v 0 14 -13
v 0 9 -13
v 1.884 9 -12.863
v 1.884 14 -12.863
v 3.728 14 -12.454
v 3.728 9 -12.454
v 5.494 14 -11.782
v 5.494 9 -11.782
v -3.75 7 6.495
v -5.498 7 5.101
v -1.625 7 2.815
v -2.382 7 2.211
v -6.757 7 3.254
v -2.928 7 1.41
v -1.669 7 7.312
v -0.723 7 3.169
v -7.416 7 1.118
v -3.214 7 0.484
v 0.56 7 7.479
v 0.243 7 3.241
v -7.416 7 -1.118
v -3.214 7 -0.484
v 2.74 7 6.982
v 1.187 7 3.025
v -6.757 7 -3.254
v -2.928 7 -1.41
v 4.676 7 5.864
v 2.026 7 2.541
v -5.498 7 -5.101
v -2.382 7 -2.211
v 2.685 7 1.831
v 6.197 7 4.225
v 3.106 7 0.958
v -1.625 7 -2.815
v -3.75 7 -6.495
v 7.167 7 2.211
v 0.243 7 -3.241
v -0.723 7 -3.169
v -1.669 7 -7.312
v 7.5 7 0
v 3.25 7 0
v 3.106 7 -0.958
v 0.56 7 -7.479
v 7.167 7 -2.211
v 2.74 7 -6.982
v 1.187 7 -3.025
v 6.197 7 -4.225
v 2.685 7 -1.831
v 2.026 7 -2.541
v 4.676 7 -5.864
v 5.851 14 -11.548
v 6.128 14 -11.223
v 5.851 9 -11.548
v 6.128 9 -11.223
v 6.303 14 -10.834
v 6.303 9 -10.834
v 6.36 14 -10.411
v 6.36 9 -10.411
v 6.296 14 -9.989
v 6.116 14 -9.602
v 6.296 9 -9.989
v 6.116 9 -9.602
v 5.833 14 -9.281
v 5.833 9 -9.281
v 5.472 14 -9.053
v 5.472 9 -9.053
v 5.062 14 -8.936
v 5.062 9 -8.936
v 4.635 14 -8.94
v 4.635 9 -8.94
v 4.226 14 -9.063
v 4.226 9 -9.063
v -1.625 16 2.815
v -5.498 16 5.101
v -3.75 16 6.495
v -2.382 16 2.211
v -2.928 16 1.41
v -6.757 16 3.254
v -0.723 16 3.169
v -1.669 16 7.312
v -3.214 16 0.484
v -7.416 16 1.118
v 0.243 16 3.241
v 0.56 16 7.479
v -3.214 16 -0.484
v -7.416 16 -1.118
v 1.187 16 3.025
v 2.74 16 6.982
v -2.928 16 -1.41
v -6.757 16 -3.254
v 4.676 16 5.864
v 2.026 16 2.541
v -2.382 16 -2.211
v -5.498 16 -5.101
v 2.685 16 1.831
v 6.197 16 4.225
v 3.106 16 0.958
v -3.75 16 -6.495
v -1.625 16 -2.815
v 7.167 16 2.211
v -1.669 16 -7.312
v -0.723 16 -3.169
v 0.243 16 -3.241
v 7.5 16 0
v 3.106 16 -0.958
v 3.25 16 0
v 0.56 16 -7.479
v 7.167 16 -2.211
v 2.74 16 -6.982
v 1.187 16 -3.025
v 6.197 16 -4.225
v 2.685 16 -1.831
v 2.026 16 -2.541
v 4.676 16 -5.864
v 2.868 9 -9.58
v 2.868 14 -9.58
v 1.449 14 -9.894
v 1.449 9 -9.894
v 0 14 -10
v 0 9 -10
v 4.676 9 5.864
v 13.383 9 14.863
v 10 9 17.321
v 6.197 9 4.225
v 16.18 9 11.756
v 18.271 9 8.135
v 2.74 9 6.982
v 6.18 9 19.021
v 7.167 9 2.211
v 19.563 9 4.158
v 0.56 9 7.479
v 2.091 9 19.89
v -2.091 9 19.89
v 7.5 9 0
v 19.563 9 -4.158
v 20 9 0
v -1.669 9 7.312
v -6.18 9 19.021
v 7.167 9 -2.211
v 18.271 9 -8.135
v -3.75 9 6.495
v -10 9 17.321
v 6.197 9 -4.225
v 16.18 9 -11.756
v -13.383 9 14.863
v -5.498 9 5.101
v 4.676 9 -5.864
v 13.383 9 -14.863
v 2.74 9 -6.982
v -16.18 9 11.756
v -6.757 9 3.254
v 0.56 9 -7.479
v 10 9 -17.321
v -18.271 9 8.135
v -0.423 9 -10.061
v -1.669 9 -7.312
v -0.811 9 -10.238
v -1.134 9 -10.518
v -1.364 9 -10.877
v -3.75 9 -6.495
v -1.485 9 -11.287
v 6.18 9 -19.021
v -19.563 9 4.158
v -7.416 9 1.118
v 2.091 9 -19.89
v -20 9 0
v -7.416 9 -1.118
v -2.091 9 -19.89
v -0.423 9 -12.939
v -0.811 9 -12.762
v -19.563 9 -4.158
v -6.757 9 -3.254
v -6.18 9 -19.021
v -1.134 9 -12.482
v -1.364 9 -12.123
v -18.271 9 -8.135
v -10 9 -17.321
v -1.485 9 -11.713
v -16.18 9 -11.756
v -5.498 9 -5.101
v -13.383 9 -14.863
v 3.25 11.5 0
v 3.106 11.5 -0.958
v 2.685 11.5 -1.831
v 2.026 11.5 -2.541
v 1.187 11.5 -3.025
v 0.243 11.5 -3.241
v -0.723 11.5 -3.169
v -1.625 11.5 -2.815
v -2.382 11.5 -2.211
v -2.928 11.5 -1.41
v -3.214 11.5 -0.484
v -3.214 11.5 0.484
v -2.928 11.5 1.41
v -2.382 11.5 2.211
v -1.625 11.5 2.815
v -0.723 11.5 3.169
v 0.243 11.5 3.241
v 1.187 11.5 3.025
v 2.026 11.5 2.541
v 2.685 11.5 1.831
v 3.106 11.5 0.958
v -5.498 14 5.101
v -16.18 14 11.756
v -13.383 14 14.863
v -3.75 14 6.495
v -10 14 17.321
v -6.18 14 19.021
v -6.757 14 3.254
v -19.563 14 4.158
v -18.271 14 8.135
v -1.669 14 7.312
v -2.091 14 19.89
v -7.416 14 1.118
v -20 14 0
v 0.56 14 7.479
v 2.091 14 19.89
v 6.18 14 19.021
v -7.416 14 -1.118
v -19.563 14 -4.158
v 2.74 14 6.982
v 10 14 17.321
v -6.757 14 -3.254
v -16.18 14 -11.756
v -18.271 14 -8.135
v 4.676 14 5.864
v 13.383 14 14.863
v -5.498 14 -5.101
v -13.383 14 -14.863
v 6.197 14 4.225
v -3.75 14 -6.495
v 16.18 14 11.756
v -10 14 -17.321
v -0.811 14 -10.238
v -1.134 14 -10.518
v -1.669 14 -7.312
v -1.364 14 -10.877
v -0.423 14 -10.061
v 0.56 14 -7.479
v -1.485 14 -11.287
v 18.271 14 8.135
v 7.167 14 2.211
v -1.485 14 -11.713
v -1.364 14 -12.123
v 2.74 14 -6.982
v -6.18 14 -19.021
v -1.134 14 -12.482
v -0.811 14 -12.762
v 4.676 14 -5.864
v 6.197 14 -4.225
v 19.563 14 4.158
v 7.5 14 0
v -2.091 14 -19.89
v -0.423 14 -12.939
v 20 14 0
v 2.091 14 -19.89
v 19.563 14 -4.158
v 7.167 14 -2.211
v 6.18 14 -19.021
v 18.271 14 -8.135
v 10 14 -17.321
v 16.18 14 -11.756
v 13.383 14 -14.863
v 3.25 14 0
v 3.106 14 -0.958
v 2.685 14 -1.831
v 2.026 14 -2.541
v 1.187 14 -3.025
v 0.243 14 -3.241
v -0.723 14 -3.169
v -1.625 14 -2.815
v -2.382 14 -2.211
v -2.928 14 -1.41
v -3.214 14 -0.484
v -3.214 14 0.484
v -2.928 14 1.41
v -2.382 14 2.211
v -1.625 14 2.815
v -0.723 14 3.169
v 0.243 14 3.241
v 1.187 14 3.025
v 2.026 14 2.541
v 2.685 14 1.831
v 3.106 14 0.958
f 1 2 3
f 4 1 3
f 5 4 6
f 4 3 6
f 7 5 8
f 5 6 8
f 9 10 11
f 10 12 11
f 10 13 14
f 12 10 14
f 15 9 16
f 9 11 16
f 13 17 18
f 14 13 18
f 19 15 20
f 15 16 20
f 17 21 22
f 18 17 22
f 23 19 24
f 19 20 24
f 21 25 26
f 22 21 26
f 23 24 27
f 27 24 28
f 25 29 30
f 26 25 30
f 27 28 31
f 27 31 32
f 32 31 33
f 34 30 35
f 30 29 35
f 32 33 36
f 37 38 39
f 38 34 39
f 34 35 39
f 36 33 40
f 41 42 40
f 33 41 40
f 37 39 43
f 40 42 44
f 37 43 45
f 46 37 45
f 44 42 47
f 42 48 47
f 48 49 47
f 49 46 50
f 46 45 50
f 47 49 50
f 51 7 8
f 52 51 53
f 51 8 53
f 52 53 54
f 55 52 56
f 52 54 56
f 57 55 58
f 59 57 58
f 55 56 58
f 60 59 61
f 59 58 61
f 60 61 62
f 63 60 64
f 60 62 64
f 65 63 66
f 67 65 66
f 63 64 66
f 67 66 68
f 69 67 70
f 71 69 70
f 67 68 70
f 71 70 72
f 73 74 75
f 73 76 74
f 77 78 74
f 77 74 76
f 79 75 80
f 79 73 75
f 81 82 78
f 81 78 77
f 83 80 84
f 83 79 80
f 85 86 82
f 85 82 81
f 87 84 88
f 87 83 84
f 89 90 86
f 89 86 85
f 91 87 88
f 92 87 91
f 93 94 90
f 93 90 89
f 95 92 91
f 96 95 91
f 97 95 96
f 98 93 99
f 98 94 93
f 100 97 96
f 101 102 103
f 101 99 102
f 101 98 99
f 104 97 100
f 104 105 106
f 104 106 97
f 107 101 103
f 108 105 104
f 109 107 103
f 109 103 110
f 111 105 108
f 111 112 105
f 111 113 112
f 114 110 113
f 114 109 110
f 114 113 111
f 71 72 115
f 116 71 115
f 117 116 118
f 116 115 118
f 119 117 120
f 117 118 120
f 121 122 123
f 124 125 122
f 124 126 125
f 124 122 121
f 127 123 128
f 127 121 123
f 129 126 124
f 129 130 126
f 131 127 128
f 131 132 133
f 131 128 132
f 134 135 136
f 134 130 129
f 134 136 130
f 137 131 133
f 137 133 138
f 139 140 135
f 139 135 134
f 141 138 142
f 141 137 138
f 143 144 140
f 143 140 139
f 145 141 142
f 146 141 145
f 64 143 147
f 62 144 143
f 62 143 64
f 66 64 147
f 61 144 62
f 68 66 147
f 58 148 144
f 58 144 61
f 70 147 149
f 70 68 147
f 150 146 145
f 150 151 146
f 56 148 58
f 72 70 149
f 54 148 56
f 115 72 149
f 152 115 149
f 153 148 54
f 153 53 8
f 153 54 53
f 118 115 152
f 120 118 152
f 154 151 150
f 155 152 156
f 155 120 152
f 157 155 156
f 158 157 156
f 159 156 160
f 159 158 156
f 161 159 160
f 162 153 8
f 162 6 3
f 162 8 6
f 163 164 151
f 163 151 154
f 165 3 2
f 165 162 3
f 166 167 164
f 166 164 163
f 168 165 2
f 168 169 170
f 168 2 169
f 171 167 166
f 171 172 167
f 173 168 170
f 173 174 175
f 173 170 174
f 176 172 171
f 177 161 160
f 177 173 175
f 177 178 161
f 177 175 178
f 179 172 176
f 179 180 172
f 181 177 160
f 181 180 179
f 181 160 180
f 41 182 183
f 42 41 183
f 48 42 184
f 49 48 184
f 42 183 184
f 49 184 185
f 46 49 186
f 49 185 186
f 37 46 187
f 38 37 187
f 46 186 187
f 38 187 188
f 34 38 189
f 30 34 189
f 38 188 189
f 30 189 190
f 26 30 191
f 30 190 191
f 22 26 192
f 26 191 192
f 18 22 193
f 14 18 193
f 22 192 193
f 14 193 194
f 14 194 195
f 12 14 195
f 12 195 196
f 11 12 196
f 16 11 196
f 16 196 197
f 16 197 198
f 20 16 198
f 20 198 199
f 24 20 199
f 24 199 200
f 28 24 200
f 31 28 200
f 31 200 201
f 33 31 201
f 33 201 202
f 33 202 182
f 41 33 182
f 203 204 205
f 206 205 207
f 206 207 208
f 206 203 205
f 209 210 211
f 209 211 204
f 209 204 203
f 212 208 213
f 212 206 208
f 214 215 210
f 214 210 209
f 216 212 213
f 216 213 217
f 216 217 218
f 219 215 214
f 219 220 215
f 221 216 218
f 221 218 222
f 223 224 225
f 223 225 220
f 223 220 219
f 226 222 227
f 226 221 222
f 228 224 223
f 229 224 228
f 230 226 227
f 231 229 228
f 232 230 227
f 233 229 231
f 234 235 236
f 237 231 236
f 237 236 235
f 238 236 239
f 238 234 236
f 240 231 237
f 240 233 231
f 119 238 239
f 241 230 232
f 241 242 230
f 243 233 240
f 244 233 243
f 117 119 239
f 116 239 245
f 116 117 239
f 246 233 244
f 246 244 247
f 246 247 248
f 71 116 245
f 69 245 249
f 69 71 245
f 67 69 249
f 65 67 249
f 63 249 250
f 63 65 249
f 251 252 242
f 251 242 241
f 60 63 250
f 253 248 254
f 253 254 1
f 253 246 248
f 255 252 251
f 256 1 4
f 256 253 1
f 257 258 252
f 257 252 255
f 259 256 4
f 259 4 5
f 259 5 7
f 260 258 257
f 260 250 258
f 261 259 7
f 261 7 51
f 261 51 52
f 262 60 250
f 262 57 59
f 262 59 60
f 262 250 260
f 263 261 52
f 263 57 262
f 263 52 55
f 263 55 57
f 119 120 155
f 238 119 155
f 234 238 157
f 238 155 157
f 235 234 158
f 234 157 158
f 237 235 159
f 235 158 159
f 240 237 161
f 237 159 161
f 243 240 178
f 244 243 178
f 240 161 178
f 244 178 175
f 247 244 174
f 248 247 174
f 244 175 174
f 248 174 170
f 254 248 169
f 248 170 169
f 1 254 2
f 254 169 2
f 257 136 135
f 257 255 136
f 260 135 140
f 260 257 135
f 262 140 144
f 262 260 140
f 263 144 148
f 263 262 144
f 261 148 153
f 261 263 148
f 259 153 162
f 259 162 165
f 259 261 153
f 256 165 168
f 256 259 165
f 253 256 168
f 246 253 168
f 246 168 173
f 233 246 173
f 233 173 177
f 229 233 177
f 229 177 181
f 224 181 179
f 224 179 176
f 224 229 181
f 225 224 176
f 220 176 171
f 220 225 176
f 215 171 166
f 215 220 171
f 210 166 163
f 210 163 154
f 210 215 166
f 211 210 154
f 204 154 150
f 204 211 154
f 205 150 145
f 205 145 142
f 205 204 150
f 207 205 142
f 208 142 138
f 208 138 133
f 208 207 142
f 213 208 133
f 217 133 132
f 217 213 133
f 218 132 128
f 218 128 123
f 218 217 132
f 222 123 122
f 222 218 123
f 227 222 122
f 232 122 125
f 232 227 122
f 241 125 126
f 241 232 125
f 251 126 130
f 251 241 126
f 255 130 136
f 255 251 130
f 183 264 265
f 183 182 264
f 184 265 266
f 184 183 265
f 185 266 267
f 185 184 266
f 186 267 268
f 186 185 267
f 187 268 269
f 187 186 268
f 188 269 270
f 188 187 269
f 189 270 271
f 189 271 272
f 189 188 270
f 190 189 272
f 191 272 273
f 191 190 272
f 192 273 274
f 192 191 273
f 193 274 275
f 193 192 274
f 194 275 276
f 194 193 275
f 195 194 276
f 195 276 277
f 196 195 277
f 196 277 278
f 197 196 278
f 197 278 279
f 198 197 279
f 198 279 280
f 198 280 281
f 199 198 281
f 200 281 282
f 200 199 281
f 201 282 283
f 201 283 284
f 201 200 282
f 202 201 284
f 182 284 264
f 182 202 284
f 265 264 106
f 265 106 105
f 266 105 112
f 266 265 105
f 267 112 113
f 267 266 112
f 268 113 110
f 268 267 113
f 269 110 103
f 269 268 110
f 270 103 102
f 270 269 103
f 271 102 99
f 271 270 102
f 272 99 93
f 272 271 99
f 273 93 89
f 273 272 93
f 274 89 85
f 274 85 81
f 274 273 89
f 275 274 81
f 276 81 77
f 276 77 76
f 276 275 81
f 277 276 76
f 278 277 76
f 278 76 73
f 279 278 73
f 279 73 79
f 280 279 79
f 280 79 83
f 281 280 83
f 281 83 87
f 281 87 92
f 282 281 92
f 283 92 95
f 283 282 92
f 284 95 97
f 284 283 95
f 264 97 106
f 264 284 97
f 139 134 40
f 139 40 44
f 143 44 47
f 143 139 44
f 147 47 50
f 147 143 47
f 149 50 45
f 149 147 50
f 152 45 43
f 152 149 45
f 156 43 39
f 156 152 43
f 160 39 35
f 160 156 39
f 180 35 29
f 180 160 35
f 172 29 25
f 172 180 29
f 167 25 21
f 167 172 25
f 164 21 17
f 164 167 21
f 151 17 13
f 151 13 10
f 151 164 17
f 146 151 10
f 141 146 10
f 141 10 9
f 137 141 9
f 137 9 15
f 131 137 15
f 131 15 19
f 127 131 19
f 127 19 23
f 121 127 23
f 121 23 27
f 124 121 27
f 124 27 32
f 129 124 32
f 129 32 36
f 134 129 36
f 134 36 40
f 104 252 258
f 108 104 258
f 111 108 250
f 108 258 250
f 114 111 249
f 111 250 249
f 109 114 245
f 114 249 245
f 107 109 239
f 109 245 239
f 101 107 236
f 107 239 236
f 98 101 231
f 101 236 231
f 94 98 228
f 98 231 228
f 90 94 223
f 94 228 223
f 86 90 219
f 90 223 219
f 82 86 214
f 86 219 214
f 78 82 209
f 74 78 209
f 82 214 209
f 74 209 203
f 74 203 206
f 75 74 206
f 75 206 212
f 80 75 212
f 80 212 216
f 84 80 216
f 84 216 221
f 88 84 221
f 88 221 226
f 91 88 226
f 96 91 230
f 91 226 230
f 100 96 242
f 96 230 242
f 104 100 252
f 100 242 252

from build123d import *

# Parameters (mm, degrees)
CORTE_EXTRUS_O3_REACH         = 16
ESBO_O4_R                     = 7.5
ESBO_O4_R_2                   = 3.25
RESSALTO_EXTRUS_O1_DEPTH      = 2
RESSALTO_EXTRUS_O1_DEPTH_BACK = 7


with BuildPart() as part:
    # Esboço1 → Revolução1 (revolve)
    with BuildSketch(Plane.XY):
        Polygon((3.25, 14), (3.25, 11.5), (5, 11.5), (5, 9), (20, 9), (20, 14), align=None)
    revolve(axis=Axis((0, 0, 0), (0, 1, 0)))

    # Esboço2 → Corte-extrusão3 (cut, up to next)
    with BuildSketch(Plane(origin=(0, 0, 0), x_dir=(1, 0, 0), z_dir=(0, 1, 0)), mode=Mode.PRIVATE) as corte_extrus_o3_sk1:
        with BuildLine():
            ThreePointArc((4.226182617, 9.06307787), (2.164396139, 9.762960071), (0, 10))
            ThreePointArc((0, 10), (-1.5, 11.5), (0, 13))
            ThreePointArc((0, 13), (2.813714981, 12.691848093), (5.494037403, 11.782001231))
            ThreePointArc((5.494037403, 11.782001231), (6.219571691, 9.788612158), (4.226182617, 9.06307787))
        make_face()
    corte_extrus_o3_tool1 = extrude(corte_extrus_o3_sk1.sketch, amount=CORTE_EXTRUS_O3_REACH, mode=Mode.PRIVATE) & part.part
    add(corte_extrus_o3_tool1.solids().sort_by_distance((2.456799, 0, -11.081905))[0], mode=Mode.SUBTRACT)

    # Esboço4 → Ressalto-extrusão1 (add, two sides)
    with BuildSketch(Plane(origin=(0, 14, 0), x_dir=(1, 0, 0), z_dir=(0, 1, 0))) as ressalto_extrus_o1_sk:
        Circle(ESBO_O4_R)
        Circle(ESBO_O4_R_2, mode=Mode.SUBTRACT)
    extrude(amount=RESSALTO_EXTRUS_O1_DEPTH)
    extrude(ressalto_extrus_o1_sk.sketch, amount=-RESSALTO_EXTRUS_O1_DEPTH_BACK)


solid = part.part
